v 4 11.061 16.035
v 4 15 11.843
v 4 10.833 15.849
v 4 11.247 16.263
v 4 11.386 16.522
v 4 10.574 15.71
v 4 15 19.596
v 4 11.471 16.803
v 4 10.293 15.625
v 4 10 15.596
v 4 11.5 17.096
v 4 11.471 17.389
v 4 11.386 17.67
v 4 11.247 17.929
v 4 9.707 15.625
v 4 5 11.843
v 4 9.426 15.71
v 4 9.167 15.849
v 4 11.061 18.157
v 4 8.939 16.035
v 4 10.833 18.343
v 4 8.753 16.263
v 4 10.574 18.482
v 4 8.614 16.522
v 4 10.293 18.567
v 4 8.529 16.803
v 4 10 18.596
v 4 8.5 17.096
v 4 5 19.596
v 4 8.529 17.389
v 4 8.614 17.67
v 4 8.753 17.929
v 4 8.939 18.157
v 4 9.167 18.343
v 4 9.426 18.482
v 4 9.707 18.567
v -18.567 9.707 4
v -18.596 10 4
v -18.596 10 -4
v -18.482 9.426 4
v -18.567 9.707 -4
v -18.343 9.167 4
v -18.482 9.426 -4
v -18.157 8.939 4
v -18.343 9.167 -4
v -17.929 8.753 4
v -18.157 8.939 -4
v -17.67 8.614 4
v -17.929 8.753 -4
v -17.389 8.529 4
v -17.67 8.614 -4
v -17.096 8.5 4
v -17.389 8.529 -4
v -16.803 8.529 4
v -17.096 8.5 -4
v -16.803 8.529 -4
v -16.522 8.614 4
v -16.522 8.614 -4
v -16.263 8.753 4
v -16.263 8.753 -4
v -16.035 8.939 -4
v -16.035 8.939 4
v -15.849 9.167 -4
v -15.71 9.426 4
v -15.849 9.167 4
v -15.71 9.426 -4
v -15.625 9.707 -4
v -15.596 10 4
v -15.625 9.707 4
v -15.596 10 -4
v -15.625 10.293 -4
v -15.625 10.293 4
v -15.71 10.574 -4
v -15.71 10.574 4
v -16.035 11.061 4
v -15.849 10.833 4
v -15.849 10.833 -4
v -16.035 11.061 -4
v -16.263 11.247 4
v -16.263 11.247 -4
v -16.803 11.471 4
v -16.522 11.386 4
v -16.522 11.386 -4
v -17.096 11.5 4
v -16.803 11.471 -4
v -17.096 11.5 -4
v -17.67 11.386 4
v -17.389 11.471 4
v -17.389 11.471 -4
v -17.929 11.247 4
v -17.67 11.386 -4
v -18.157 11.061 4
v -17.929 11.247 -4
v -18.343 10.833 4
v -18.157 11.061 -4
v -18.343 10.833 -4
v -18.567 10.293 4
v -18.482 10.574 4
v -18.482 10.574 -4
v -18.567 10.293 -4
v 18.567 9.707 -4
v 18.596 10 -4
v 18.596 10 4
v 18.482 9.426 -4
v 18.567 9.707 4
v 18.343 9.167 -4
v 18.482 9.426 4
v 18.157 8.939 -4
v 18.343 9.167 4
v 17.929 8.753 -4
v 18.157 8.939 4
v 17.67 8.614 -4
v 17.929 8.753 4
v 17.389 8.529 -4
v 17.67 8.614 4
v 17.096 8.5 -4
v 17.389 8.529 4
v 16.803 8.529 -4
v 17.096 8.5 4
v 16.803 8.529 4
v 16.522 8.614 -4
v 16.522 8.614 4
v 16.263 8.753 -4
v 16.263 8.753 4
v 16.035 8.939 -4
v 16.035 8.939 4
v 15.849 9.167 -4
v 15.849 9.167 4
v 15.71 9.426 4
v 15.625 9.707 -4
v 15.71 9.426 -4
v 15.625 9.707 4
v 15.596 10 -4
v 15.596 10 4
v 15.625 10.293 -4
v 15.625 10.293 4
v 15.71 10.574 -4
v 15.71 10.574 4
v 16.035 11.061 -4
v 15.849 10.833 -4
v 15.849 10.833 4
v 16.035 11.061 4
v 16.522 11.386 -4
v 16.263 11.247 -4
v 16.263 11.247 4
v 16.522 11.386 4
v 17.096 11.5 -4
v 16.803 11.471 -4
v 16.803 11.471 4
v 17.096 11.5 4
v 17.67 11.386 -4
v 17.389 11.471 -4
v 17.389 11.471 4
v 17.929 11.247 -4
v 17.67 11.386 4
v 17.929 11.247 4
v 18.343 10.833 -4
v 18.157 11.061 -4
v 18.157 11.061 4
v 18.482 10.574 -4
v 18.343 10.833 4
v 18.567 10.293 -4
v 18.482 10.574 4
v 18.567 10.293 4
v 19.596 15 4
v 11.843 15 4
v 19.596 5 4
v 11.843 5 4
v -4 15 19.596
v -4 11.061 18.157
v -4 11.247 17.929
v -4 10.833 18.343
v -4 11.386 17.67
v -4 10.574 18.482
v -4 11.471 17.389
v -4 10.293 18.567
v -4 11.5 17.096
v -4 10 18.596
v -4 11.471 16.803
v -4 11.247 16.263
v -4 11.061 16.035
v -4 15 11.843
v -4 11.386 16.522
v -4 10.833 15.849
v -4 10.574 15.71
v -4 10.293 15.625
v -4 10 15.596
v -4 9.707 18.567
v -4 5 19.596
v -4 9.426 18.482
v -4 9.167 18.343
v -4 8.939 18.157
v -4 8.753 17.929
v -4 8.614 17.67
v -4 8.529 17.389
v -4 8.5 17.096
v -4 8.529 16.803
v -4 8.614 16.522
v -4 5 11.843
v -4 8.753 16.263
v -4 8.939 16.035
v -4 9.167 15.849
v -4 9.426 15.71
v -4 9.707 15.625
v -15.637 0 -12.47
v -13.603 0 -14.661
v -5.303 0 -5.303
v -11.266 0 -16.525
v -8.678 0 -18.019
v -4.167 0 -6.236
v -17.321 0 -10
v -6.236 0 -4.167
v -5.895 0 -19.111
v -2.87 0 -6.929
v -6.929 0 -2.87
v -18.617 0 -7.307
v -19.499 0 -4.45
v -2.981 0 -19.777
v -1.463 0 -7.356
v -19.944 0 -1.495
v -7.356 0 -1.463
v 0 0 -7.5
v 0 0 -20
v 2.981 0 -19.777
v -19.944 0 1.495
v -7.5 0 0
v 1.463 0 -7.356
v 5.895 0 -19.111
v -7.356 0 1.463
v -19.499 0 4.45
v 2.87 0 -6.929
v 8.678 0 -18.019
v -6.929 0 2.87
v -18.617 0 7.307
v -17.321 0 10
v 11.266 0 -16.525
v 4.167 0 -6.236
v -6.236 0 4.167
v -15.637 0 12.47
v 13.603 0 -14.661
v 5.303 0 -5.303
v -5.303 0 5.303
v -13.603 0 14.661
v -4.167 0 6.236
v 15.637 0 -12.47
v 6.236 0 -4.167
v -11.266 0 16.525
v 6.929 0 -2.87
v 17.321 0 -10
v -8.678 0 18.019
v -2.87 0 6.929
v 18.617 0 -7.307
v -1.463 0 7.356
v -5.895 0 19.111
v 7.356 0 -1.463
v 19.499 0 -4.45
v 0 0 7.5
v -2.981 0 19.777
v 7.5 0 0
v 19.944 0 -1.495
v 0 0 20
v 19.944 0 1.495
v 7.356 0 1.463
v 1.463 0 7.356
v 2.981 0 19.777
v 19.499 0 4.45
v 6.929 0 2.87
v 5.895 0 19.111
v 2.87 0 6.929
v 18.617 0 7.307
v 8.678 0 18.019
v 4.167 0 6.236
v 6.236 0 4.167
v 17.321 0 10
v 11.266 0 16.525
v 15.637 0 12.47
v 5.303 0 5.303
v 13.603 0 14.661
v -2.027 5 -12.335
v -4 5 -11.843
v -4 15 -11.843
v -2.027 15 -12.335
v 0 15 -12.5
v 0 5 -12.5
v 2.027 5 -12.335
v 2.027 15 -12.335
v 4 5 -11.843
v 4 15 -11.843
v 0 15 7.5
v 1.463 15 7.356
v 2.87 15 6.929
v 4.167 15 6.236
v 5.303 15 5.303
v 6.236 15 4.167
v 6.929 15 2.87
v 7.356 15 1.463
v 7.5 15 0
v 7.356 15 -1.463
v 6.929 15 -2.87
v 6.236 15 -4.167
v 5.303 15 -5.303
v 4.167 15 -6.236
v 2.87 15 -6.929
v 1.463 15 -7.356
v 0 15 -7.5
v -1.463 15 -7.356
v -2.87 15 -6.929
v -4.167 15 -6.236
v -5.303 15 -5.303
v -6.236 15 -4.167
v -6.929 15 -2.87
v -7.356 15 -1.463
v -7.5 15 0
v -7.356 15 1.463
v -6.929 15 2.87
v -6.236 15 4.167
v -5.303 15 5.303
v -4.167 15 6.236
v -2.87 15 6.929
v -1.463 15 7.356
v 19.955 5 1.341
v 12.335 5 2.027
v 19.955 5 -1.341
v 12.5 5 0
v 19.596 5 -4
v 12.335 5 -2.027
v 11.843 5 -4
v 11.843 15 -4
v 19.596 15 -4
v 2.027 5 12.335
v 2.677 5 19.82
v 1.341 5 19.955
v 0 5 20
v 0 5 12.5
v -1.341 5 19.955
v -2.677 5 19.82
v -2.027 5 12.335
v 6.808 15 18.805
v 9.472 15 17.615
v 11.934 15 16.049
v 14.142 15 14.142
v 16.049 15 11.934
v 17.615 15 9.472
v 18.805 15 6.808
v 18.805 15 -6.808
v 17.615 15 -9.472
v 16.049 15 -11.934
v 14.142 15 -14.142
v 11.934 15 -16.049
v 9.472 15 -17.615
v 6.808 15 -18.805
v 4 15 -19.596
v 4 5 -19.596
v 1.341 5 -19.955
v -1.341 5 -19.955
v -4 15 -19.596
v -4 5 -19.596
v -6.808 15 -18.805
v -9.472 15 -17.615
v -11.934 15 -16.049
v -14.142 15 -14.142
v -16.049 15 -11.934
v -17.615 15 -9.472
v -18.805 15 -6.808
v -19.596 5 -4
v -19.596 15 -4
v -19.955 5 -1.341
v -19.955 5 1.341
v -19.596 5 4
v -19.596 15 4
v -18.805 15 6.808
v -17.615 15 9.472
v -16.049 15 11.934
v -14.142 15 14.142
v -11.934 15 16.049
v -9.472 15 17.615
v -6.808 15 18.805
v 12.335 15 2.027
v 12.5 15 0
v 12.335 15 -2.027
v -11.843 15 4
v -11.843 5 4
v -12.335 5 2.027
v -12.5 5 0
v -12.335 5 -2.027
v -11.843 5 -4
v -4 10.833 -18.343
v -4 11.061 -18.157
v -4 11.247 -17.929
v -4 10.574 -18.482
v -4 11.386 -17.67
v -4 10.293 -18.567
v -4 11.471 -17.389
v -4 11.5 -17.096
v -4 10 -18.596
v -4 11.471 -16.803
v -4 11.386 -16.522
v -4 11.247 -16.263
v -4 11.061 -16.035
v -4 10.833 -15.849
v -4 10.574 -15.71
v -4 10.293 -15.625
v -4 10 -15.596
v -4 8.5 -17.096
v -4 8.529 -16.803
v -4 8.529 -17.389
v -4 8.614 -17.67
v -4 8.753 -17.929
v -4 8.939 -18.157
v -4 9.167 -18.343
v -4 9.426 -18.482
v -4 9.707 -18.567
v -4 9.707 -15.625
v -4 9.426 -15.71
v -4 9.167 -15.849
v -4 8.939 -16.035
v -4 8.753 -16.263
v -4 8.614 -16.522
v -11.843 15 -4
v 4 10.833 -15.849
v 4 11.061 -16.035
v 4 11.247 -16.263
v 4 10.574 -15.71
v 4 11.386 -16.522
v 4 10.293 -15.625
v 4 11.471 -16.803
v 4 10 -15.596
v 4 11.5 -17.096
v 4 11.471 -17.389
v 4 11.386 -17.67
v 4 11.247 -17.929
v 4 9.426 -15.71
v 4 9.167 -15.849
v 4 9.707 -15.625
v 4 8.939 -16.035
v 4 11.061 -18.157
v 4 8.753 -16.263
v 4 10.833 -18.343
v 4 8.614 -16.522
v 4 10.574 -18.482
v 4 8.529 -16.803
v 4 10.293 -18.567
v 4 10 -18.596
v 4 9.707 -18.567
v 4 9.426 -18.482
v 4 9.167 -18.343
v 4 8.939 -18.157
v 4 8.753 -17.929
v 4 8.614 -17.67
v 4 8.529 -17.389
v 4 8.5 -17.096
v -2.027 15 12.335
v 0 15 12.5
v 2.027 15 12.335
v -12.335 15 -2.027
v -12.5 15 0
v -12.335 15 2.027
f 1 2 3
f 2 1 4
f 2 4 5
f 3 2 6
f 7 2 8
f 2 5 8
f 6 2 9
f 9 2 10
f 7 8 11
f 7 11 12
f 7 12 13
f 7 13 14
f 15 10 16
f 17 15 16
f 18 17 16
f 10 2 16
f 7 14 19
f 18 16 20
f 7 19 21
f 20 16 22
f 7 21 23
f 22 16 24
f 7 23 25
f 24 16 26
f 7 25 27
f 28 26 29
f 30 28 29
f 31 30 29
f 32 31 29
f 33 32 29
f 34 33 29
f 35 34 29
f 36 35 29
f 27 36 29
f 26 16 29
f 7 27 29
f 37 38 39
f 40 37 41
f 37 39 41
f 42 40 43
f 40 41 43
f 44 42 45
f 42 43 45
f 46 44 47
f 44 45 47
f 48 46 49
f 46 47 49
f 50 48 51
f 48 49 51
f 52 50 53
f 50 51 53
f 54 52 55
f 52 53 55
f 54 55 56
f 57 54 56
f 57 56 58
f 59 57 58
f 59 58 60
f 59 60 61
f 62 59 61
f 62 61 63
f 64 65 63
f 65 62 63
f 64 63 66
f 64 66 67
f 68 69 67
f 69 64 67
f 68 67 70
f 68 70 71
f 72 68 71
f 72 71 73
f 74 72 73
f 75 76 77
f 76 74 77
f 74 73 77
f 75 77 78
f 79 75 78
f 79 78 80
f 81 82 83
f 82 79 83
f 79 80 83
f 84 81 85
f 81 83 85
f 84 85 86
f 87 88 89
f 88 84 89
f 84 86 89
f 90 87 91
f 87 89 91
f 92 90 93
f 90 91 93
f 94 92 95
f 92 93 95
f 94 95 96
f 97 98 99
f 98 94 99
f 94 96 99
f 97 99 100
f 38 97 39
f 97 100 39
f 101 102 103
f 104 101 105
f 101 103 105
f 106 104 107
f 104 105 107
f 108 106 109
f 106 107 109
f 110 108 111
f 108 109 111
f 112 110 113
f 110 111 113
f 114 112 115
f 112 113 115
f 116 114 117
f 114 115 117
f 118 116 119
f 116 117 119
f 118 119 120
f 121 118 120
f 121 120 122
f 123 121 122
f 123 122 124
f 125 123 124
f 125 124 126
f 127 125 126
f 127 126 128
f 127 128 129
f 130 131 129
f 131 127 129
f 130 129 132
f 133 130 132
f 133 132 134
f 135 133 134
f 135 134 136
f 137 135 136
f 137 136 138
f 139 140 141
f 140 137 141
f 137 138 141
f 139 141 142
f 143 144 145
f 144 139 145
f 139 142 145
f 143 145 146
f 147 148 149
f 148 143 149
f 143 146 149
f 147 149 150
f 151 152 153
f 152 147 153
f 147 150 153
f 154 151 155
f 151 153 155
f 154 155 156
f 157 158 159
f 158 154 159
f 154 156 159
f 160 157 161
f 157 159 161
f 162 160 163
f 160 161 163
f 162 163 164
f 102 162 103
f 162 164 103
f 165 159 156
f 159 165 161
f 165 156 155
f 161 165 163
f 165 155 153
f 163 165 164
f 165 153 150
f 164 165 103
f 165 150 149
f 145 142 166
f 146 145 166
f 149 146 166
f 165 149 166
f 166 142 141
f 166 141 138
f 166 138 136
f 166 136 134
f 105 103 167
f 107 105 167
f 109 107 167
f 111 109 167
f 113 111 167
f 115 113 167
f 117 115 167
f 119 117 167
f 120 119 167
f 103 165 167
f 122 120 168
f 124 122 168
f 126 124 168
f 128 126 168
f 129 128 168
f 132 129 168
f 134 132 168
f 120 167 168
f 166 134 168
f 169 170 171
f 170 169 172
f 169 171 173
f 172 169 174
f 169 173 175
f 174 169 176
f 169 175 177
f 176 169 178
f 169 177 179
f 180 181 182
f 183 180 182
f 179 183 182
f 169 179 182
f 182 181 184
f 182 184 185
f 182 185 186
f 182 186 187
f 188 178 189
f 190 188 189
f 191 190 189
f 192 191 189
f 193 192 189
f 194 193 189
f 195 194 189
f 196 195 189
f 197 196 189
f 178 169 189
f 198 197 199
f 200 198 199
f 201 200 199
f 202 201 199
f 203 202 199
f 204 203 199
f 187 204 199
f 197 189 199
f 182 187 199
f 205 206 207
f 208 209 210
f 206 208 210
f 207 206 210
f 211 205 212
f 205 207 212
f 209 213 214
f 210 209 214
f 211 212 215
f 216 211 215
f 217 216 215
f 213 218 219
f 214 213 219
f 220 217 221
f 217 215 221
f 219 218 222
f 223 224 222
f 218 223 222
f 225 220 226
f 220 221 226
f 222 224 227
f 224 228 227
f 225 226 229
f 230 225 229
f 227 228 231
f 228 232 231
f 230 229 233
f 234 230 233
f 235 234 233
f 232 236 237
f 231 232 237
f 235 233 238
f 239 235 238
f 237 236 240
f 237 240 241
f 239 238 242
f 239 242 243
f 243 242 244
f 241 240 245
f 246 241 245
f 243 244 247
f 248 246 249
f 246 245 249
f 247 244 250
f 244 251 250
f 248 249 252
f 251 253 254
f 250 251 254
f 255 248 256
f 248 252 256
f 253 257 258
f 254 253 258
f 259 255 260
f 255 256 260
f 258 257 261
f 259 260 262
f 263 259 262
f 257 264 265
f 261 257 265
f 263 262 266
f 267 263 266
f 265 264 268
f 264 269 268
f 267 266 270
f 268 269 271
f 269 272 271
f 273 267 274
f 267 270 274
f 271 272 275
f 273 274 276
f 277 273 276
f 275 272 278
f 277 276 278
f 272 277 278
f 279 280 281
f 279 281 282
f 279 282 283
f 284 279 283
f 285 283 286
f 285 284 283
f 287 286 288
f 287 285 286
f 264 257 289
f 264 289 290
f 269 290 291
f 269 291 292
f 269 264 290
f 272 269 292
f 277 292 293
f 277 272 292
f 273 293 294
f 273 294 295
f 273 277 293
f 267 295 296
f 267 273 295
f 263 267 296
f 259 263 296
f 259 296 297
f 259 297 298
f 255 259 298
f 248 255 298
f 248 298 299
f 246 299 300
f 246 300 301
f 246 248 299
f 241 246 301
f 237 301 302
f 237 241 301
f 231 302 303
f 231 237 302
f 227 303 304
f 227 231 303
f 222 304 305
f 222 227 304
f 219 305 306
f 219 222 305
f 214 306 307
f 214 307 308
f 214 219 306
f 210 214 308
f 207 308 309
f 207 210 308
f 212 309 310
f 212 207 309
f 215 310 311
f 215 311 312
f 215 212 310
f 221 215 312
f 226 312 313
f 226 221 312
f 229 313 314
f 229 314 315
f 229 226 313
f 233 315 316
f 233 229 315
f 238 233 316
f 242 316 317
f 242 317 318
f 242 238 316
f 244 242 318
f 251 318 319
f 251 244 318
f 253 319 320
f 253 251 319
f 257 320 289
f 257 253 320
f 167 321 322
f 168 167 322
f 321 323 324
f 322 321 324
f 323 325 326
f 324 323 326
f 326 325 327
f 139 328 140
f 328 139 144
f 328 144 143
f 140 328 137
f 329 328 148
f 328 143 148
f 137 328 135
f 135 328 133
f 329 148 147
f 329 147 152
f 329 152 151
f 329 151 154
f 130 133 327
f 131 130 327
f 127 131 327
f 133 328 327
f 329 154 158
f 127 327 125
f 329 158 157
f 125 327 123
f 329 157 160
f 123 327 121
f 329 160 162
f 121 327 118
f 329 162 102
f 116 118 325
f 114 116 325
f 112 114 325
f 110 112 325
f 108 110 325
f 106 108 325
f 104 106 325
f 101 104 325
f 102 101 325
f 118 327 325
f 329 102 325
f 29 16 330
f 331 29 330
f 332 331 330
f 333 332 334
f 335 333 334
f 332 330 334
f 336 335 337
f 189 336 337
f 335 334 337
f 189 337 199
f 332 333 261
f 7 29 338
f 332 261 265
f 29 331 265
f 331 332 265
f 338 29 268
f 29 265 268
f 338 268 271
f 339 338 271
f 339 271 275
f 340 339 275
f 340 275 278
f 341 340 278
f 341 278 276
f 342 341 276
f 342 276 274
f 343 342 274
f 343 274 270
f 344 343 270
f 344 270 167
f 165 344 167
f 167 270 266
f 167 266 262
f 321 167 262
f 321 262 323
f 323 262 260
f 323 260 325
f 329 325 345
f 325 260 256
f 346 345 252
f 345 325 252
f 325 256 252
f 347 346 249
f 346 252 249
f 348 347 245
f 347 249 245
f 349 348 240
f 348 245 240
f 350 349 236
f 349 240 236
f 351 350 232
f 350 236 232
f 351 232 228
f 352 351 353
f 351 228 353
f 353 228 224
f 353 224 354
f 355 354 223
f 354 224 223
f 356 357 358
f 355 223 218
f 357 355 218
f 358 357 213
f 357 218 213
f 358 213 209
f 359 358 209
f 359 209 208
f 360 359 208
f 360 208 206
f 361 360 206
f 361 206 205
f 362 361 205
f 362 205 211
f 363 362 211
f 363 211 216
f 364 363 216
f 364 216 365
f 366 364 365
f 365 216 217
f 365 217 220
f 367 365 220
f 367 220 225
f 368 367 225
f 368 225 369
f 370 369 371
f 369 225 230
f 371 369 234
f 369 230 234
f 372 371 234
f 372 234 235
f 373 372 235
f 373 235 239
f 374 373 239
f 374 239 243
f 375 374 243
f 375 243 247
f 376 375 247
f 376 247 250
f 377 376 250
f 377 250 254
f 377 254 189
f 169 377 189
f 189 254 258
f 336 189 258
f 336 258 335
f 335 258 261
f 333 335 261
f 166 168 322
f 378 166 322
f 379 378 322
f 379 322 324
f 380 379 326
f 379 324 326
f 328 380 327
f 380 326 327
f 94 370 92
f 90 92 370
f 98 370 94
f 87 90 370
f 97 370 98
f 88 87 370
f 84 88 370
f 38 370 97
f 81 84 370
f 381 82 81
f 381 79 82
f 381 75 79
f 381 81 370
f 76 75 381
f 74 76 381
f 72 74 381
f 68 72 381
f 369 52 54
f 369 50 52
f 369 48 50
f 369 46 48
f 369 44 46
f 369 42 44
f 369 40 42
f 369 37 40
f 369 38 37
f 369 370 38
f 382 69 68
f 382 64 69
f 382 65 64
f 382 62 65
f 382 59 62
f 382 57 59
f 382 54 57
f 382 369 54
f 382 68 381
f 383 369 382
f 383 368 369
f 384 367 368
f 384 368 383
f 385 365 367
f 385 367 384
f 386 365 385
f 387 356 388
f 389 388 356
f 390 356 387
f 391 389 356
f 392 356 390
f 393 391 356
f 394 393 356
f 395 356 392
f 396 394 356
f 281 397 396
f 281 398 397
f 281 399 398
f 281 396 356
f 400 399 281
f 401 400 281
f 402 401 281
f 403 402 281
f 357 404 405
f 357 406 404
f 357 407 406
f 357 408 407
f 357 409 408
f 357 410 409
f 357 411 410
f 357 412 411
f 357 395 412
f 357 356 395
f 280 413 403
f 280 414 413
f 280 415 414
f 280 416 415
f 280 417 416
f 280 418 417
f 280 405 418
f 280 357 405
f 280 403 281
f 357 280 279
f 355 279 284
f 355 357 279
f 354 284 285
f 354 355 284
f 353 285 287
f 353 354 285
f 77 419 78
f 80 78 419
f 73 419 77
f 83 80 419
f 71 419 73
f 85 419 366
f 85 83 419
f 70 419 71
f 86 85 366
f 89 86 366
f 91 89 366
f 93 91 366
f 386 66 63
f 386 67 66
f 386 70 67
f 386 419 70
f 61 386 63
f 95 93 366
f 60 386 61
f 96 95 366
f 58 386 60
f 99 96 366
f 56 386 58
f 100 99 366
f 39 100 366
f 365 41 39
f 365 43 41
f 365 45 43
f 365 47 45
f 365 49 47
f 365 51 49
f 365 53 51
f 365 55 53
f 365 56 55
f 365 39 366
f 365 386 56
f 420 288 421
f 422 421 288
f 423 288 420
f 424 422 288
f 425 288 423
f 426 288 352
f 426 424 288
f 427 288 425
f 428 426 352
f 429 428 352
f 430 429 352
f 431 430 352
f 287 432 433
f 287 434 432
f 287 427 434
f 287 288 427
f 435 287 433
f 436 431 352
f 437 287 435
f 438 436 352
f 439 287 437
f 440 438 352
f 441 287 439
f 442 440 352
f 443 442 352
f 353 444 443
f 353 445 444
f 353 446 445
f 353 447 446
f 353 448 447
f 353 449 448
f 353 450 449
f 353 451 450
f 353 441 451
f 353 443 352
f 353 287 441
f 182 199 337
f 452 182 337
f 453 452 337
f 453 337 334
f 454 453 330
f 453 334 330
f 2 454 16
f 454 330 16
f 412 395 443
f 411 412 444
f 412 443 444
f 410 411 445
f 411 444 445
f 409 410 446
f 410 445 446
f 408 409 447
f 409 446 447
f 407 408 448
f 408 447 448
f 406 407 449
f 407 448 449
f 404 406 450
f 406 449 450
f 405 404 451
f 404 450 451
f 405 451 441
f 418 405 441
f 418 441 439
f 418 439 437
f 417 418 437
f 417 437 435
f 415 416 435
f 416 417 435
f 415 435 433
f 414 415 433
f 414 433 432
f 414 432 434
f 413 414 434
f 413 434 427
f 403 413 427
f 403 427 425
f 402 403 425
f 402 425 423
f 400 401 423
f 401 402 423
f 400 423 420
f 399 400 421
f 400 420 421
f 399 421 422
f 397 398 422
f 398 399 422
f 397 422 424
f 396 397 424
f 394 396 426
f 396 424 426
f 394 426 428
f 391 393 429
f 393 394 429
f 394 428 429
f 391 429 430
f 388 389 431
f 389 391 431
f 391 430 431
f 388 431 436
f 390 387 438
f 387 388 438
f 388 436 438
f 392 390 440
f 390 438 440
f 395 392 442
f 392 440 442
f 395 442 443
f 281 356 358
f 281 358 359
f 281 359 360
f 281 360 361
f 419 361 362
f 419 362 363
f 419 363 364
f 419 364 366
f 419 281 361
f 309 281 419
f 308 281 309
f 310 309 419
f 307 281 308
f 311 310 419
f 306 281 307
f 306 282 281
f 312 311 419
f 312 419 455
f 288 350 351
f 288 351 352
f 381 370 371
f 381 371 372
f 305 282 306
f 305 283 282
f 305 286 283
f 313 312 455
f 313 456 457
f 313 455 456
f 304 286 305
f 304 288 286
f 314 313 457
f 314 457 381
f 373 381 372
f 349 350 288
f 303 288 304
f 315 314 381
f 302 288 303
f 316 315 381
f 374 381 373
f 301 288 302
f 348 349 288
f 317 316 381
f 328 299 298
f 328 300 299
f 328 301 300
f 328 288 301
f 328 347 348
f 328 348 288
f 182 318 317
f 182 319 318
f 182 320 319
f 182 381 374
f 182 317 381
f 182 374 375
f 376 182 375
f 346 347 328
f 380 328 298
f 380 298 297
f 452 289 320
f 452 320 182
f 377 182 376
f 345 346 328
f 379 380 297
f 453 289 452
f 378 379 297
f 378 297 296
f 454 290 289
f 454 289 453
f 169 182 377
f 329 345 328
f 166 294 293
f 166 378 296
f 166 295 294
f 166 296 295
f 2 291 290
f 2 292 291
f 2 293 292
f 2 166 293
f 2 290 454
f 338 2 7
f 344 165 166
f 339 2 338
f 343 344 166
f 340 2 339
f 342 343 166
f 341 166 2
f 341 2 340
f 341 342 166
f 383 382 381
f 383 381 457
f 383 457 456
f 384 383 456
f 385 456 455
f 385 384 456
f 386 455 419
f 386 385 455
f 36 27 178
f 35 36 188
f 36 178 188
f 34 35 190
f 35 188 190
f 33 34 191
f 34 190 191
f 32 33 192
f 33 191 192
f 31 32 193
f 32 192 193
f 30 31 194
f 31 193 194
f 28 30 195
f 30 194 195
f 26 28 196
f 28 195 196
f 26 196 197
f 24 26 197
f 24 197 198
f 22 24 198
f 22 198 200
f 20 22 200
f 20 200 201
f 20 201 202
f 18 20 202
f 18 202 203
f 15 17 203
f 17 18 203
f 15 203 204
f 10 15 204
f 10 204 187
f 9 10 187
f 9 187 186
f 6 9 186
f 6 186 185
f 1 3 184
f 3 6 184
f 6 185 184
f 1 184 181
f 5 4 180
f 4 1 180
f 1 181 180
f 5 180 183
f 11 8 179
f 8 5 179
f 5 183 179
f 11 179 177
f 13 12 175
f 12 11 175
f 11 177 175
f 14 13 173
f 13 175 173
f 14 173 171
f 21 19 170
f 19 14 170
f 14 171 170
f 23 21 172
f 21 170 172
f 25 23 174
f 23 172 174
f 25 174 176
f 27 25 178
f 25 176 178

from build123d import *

# Parameters (mm, degrees)
SKETCH1_R           = 20
SKETCH1_R_2         = 7.5
BOSS_EXTRUDE1_DEPTH = 15
CUT_EXTRUDE1_START  = -10
CUT_EXTRUDE1_DEPTH  = 10
SKETCH4_R           = 1.5
BOSS_EXTRUDE2_DEPTH = 10
CIRPATTERN1_COUNT   = 4


with BuildPart() as part:
    # Sketch1 → Boss-Extrude1 (new body)
    with BuildSketch(Plane(origin=(0, 0, 0), x_dir=(1, 0, 0), z_dir=(0, 1, 0))):
        with Locations(Location((0, 0, 0), (0, 0, 270))):
            Circle(SKETCH1_R)
        with Locations(Location((0, 0, 0), (0, 0, 270))):
            Circle(SKETCH1_R_2, mode=Mode.SUBTRACT)
    extrude(amount=BOSS_EXTRUDE1_DEPTH)

    # Sketch2 → Cut-Extrude1 (cut)
    with BuildSketch(Plane(origin=(0, 15, 0), x_dir=(1, 0, 0), z_dir=(0, 1, 0)).offset(CUT_EXTRUDE1_START)):
        with BuildLine():
            Line((-19.595917942, -4), (-11.842719282, -4))
            ThreePointArc((-11.842719282, -4), (-12.5, 0), (-11.842719282, 4))
            Line((-11.842719282, 4), (-19.595917942, 4))
            ThreePointArc((-19.595917942, 4), (-20, 0), (-19.595917942, -4))
        make_face()
        with BuildLine():
            Line((-4, 19.595917942), (-4, 11.842719282))
            ThreePointArc((-4, 11.842719282), (0, 12.5), (4, 11.842719282))
            Line((4, 11.842719282), (4, 19.595917942))
            ThreePointArc((4, 19.595917942), (0, 20), (-4, 19.595917942))
        make_face()
        with BuildLine():
            Line((11.842719282, 4), (19.595917942, 4))
            ThreePointArc((19.595917942, 4), (20, 0), (19.595917942, -4))
            Line((19.595917942, -4), (11.842719282, -4))
            ThreePointArc((11.842719282, -4), (12.5, 0), (11.842719282, 4))
        make_face()
        with BuildLine():
            Line((4, -11.842719282), (4, -19.595917942))
            ThreePointArc((4, -19.595917942), (0, -20), (-4, -19.595917942))
            Line((-4, -19.595917942), (-4, -11.842719282))
            ThreePointArc((-4, -11.842719282), (0, -12.5), (4, -11.842719282))
        make_face()
    extrude(amount=CUT_EXTRUDE1_DEPTH, mode=Mode.SUBTRACT)

    # Sketch4 → Boss-Extrude2 (add)
    with BuildSketch(Plane(origin=(0, 0, 4), x_dir=(-1, 0, 0), z_dir=(0, 0, -1))):
        with Locations(Location((-17.095917942, 10, 0), (0, 0, 180))):
            Circle(SKETCH4_R)
    boss_extrude2 = extrude(amount=BOSS_EXTRUDE2_DEPTH)

    # CirPattern1: Boss-Extrude2 ×4 about axis
    cirpattern1_axis = Axis((0, 15, 0), (0, -1, 0))
    for i in range(1, CIRPATTERN1_COUNT):
        add(boss_extrude2.rotate(cirpattern1_axis, i * 360 / CIRPATTERN1_COUNT))


solid = part.part
